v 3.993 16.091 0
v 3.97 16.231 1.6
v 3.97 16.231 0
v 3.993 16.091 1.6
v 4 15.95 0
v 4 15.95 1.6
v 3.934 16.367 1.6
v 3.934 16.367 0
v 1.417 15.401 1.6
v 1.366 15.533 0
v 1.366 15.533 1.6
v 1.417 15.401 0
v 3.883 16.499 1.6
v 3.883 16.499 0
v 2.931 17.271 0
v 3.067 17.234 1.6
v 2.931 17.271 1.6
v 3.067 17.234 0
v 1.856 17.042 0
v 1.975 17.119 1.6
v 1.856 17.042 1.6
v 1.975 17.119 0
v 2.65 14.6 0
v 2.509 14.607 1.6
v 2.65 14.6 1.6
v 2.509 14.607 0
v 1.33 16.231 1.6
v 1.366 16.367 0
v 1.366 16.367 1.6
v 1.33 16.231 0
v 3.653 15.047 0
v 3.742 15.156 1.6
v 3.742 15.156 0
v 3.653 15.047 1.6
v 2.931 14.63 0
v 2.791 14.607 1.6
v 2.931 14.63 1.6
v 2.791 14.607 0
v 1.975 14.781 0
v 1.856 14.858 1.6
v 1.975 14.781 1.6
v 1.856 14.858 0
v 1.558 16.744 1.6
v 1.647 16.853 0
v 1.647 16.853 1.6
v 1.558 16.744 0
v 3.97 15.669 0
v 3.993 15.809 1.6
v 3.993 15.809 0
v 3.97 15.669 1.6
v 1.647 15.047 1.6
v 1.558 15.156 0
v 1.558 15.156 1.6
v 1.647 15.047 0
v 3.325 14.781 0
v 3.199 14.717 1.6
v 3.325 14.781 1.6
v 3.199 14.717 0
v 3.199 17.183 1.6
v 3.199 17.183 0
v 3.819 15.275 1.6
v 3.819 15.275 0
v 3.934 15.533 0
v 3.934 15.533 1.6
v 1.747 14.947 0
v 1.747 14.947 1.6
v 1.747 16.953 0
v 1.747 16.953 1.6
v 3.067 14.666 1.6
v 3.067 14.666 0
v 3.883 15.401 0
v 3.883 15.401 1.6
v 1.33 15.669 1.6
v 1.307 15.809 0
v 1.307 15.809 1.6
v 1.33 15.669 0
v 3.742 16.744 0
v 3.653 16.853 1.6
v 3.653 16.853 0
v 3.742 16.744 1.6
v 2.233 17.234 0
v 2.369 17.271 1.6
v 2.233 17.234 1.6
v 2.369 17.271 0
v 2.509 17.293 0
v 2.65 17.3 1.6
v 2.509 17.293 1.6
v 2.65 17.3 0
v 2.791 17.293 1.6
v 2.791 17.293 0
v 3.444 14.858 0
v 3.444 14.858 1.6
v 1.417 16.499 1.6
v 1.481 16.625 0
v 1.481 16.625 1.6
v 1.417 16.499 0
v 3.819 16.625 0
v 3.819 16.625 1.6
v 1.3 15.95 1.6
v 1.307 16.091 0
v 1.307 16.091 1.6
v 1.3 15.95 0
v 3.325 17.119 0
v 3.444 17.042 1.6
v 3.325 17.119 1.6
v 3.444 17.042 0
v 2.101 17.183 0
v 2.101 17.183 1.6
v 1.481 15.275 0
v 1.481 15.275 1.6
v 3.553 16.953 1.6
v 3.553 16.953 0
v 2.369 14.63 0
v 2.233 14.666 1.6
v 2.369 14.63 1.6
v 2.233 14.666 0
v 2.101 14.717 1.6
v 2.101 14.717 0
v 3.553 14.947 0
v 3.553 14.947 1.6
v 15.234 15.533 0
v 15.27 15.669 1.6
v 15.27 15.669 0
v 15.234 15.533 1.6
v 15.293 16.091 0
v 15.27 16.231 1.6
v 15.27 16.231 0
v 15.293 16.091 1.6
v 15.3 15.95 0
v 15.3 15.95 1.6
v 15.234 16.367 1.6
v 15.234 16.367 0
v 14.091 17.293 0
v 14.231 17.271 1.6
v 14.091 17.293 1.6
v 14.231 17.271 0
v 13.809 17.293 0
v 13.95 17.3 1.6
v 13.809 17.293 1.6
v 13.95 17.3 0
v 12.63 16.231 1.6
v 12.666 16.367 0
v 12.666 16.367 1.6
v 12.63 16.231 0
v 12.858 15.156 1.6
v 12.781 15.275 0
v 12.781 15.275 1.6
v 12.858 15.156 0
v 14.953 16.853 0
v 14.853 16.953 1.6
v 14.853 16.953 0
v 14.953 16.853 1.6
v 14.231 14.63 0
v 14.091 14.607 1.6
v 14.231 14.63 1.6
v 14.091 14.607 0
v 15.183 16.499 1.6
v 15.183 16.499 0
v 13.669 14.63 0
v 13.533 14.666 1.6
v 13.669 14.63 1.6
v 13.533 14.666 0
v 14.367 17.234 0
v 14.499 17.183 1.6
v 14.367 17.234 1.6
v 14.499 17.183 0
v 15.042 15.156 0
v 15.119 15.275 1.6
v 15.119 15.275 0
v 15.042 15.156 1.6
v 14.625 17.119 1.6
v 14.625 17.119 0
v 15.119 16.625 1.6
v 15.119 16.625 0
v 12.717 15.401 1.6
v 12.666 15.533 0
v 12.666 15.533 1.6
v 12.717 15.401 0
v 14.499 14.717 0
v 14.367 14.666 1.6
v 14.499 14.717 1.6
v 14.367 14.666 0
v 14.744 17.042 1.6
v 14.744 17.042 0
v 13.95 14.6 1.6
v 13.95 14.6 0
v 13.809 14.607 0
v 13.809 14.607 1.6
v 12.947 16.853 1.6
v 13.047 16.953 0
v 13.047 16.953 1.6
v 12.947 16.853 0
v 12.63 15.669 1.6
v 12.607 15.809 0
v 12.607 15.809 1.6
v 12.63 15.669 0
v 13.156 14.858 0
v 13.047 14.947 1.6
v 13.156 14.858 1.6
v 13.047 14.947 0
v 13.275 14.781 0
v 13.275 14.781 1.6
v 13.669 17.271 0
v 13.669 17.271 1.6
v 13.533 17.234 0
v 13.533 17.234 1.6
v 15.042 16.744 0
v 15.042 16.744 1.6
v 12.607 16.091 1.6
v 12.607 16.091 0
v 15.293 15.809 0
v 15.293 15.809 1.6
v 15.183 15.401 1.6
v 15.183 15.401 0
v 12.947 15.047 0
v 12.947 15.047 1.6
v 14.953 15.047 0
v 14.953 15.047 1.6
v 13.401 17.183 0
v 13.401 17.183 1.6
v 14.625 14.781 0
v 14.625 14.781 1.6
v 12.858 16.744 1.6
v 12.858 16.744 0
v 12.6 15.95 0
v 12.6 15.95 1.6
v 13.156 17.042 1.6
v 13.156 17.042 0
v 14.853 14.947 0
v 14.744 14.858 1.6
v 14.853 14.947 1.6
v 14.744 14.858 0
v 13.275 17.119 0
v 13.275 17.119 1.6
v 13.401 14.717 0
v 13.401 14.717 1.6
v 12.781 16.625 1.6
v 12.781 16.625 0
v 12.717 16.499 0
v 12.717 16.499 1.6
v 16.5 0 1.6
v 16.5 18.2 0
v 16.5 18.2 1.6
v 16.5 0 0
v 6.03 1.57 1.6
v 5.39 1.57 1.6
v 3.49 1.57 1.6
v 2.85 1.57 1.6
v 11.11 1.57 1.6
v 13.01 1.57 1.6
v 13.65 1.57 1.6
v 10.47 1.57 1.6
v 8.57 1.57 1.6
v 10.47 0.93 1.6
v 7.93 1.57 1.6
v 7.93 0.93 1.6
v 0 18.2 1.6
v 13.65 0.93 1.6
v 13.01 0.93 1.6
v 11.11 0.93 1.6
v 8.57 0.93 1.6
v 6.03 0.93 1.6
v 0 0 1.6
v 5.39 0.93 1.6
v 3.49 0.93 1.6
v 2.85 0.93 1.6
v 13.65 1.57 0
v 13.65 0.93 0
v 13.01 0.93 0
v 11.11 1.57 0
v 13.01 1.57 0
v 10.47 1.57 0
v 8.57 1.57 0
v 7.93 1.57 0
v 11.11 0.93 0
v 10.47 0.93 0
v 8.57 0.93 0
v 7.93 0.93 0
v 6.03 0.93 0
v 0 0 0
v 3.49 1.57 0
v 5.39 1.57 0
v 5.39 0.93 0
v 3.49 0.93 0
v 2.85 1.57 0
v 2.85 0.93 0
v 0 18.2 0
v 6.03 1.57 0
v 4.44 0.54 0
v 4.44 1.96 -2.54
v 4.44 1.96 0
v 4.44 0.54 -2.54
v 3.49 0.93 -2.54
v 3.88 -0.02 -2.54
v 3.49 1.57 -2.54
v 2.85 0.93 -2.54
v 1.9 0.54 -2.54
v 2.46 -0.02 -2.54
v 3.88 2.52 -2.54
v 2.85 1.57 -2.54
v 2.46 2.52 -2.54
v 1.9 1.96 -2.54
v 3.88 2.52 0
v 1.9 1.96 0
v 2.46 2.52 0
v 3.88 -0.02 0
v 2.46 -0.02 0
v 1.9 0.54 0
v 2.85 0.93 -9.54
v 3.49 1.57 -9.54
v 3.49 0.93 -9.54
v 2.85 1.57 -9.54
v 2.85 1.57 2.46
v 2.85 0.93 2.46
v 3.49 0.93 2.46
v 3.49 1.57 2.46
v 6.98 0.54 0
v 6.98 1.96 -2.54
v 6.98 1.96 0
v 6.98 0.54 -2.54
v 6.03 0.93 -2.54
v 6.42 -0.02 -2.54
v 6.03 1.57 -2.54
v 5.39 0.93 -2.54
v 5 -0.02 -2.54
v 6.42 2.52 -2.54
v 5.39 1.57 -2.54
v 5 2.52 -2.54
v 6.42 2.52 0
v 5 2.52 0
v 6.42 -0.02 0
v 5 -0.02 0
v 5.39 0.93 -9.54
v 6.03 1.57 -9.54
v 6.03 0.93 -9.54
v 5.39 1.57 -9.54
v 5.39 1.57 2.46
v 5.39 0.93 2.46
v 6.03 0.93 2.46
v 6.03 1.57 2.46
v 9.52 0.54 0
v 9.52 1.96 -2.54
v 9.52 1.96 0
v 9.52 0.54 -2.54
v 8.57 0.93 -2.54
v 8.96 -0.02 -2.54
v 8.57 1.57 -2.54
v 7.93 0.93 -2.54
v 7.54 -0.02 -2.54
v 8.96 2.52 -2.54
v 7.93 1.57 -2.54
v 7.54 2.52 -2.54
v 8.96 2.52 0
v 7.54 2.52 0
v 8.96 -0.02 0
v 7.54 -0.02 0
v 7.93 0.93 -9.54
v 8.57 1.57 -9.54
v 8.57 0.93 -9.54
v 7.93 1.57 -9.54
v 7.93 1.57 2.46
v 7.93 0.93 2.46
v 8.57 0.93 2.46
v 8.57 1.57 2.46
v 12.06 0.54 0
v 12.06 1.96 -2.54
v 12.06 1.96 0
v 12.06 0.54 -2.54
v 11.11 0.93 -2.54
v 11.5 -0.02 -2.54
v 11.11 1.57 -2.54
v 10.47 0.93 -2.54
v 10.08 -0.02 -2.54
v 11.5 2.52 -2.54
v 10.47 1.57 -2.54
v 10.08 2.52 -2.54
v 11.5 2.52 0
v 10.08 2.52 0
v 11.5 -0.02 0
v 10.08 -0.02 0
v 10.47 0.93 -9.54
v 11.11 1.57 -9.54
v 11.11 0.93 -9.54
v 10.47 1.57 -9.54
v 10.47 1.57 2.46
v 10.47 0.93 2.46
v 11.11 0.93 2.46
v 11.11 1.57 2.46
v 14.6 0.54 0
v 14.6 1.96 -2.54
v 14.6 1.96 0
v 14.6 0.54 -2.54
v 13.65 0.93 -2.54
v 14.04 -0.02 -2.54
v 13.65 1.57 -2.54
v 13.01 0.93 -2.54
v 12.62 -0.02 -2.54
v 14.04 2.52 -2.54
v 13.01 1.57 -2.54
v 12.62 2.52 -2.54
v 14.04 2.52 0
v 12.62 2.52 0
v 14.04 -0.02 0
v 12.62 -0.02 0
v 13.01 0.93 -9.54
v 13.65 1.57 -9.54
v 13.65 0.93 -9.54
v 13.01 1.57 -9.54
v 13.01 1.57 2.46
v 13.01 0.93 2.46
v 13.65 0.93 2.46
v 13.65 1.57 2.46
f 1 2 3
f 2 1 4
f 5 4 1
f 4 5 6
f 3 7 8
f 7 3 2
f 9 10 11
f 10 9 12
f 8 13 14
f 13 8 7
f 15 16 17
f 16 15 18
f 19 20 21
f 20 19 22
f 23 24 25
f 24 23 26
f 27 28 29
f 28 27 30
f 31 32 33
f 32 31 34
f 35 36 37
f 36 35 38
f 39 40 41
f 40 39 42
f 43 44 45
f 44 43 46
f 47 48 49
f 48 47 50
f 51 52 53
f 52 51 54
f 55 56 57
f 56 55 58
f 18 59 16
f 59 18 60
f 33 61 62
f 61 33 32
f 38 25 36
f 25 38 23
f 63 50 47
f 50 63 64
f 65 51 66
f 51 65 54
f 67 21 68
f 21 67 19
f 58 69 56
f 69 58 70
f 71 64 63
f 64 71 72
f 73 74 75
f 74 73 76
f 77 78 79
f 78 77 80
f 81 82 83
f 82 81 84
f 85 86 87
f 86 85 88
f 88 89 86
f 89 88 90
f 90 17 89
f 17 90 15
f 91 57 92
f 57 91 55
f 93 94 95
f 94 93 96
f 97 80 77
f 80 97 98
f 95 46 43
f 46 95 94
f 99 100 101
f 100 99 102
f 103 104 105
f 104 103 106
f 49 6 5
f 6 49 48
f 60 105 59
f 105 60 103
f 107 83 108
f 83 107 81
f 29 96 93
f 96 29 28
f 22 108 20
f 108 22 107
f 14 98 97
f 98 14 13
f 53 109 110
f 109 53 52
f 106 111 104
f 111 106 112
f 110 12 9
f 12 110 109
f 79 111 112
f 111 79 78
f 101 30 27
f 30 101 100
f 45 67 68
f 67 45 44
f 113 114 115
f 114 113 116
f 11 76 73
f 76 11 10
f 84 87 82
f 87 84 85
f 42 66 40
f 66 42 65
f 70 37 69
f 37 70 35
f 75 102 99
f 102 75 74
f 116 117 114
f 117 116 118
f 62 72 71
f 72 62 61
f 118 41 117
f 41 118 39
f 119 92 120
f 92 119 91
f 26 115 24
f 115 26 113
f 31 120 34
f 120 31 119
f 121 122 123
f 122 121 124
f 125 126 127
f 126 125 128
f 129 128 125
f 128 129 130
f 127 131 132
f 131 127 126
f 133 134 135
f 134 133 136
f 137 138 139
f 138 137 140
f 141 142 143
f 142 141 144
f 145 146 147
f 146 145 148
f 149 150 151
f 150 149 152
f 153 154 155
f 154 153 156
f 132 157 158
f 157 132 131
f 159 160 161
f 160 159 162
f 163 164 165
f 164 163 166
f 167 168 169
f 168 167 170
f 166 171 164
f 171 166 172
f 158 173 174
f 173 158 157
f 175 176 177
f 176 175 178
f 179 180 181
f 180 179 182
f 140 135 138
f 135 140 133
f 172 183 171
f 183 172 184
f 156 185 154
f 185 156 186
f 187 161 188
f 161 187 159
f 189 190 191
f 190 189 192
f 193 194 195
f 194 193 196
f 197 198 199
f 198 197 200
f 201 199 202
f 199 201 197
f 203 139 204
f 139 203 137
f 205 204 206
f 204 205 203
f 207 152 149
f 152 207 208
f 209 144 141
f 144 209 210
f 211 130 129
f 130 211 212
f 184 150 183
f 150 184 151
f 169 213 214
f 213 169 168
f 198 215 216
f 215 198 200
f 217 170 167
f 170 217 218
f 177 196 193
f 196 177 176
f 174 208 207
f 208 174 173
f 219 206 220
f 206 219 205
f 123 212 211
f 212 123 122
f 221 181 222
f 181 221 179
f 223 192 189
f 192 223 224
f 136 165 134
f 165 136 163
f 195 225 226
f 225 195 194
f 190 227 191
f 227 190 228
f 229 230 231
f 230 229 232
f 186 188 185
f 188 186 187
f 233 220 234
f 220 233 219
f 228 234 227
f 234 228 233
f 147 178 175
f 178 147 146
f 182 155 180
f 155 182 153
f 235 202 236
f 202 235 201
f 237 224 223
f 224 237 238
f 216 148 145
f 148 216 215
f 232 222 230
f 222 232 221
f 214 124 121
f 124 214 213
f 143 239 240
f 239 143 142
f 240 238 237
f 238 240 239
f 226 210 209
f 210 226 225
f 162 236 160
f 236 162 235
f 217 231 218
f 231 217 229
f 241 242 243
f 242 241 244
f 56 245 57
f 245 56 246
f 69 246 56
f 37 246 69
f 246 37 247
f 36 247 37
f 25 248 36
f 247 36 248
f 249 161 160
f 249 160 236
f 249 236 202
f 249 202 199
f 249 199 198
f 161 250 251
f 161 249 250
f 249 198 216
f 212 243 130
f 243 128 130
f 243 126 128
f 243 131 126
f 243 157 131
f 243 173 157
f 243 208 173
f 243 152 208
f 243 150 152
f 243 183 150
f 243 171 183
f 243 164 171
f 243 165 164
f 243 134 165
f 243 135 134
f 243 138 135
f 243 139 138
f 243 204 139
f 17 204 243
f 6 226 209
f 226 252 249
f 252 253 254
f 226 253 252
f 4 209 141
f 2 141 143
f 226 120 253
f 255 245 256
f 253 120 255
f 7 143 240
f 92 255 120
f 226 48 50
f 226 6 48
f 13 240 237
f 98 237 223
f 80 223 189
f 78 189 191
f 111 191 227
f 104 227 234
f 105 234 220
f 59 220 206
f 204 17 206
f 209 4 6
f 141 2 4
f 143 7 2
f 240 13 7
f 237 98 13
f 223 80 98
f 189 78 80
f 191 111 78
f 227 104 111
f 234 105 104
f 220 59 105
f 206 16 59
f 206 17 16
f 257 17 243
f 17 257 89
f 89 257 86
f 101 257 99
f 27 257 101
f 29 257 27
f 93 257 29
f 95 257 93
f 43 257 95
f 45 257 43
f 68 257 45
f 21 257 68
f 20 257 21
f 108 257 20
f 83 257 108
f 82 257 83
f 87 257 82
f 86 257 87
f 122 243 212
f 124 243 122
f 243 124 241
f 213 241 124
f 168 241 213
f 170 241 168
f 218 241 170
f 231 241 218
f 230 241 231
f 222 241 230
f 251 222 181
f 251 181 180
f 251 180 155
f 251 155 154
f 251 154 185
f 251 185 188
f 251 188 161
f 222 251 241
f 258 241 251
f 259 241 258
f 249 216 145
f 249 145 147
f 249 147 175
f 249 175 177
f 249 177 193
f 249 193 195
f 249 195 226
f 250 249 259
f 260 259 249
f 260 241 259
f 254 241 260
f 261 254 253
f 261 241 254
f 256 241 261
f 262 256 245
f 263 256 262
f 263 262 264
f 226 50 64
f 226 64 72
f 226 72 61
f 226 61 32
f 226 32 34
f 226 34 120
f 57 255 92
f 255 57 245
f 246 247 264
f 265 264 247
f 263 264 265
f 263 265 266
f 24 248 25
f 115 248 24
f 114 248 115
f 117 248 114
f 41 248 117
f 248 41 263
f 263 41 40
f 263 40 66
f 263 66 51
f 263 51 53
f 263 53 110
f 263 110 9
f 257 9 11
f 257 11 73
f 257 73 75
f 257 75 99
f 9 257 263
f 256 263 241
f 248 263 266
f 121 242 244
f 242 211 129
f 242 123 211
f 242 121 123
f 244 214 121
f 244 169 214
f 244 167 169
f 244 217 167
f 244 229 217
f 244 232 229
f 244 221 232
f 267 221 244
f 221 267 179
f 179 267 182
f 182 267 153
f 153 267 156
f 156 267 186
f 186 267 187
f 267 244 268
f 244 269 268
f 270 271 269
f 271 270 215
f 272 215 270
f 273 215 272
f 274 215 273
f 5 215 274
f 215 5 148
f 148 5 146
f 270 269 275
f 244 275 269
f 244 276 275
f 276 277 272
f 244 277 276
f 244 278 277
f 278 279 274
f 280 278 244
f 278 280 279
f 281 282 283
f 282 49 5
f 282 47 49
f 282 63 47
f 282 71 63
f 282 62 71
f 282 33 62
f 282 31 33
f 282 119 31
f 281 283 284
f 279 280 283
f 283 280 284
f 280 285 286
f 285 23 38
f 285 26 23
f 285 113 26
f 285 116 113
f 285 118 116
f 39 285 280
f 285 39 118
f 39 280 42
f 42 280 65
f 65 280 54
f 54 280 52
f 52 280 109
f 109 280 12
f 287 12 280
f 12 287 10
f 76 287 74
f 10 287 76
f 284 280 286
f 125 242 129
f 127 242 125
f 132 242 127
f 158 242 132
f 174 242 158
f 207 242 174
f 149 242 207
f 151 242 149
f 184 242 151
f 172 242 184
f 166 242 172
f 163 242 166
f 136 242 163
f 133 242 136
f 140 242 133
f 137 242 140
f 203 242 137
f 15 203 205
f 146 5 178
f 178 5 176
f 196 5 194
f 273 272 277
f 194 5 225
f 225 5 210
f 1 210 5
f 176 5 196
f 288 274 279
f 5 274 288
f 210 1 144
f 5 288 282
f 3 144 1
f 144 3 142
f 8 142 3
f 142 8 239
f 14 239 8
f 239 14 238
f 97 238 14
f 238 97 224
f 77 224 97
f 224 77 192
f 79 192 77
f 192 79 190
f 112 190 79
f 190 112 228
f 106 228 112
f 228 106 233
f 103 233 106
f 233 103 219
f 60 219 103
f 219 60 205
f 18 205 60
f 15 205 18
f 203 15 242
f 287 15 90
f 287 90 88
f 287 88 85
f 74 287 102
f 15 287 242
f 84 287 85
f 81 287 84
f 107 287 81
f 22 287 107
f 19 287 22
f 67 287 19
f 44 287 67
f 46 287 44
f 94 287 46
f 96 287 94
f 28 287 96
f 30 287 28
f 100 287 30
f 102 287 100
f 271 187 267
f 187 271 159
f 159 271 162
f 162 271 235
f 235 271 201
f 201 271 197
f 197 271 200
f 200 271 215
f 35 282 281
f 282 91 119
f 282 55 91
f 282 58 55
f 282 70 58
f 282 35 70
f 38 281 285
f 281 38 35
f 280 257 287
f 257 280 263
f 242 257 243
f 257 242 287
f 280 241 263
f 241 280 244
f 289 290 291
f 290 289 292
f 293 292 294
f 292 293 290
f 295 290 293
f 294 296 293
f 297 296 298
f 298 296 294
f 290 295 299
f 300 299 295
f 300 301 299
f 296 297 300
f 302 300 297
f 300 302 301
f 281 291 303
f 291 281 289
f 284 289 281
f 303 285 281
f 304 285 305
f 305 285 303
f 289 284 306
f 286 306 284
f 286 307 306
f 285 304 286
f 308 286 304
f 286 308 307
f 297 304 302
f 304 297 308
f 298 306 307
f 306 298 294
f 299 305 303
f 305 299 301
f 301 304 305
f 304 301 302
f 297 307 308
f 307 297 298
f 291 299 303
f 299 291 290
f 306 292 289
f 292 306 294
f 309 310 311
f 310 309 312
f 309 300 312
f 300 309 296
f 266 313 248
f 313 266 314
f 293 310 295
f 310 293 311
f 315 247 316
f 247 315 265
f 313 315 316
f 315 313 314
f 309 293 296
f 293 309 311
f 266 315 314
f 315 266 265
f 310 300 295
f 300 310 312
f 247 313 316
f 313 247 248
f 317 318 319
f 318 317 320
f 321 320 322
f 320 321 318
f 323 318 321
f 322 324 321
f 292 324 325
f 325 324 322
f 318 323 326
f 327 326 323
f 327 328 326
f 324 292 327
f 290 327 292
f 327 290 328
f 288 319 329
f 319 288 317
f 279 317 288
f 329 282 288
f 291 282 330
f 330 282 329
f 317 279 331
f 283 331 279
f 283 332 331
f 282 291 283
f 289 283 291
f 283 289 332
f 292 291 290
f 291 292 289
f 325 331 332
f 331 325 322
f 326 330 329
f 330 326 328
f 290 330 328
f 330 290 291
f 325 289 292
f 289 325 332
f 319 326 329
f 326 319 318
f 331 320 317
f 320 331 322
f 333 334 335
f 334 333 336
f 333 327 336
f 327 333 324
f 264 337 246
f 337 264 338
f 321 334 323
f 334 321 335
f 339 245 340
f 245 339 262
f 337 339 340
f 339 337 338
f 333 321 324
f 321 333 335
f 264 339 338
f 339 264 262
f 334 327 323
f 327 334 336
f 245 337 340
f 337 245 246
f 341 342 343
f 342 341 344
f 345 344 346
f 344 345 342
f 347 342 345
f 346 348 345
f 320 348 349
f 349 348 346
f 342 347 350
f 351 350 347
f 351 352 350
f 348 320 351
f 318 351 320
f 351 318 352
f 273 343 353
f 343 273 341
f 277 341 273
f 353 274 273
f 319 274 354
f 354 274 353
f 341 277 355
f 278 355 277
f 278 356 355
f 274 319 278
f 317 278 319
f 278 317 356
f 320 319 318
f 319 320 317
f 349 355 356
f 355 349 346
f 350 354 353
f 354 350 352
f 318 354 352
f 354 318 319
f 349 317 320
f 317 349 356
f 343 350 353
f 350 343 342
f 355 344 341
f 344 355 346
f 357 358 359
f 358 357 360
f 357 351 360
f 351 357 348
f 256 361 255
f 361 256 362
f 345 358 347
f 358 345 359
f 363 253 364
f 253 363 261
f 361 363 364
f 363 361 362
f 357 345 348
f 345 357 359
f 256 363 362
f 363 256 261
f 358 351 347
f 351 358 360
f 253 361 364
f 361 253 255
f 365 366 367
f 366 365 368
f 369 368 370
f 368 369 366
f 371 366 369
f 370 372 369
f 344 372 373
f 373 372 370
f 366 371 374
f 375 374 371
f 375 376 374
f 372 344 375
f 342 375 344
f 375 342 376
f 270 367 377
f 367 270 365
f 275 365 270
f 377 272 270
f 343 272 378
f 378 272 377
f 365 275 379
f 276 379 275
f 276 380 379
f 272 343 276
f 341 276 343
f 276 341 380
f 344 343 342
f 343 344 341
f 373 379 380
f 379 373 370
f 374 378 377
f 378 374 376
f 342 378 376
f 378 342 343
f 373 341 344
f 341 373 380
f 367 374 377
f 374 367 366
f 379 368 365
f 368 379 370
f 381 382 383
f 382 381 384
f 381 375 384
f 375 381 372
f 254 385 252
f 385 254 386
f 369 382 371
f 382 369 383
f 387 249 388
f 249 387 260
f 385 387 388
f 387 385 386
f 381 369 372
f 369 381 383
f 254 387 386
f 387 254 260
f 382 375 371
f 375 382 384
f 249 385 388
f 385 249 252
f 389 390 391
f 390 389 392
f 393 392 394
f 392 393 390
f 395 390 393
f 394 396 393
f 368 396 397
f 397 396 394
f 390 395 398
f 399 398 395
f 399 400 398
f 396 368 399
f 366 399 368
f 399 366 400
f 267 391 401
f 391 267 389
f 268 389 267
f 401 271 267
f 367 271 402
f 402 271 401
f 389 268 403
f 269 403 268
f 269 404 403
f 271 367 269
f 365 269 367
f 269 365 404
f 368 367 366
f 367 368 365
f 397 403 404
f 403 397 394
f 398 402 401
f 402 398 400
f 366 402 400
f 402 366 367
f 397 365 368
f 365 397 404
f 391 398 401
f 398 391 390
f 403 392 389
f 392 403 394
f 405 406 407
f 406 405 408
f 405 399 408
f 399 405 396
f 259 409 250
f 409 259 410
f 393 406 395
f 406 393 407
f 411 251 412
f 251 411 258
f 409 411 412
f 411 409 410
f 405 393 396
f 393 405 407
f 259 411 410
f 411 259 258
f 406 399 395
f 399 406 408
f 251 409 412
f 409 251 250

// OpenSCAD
// file: pin_headers.scad
// pin_headers.scad
//
// Model of through-hole pin headers. 
// 
// Units are metric
//
// "height" is the total length of the pin. Default is 12mm.
// "upper" is the length of the pin above the stopper. Default is 7mm.
// "rows" is the number of rows. Default is 3.
// "cols" is the number of columns. Default is 2.
//
// Examples:
// pin_header( 12, 7, 2, 5);
// pin_header( rows=5 cols=1 );
// By Paul McGovern

module pin_header( height=12, upper=7, rows=3, cols=2 ) {

	cl = 2.54;

	translate( [ -(rows  * cl/2 ) + cl /2, -(cols  * cl/2 ) + cl /2, 0 ] ) {

		for( col = [0: cols -1 ] ) {
			for( row = [0 : rows -1 ] ) {

				translate( [ cl * row , cl * col, 0] ) {
	
					color( "gray" )
						translate( [0,0, cl / 2]) {
							intersection() {
								cube( [ cl, cl, cl ], center=true );
								rotate( [0, 0, 45] ) cube( [ 2.8, 2.8, cl ], center=true );
						}
				}

				color( "silver" ) {
					translate( [0,0, (upper - ( height/2 )) + cl ] ) {
						union() {
							cube( [0.64,0.64,height], center=true );
							translate( [0,0, height/2 ] ) scale( 0.64 ) _pin_point();
							translate( [0,0, -height/2 ] ) scale( 0.64 )	rotate([180,0,0] )_pin_point();
						}
					}
				}
			}
		}
	}
}
}

module _pin_point() {
	translate( [-0.5,-0.5, 0])
		polyhedron( 
			points=[[0,0,0],[0,1,0],[1,1,0],[1,0,0],[0.5,0.5,0.5]], 
			triangles=[[0,1,2],[0,2,3],[0,1,4],[1,2,4],[2,3,4],[3,0,4]]);
}
// main file
// Sensor modules from Adafruit
// License GNU AFFERO GENERAL PUBLIC LICENSE v3+
// Copyright 2014 Christian Ege <k4230r6@gmail.com>


use <pin_headers.scad>;

sensor_drill_holes = 2.3;
sensor_z = 1.6;

// Humidity
htu21d_x = 16.5;
htu21d_y = 18.2;
htu21d_z = sensor_z;
htu21d_holes = [  [2.45,15.75],  [13.75,15.75]];

// Lux - Sensor
tsl2591_x = 19.1;
tsl2591_y = 16.4;
tsl2591_z = sensor_z;
tsl2591_holes = [ [2.45,13.7],  [15.15,13.7] ];

// Presure Sensor
bmp180_x = 17.6;
bmp180_y = 19.3;
bmp180_z = sensor_z;
bmp180_holes = [  [2.45,17.0],  [15.15,17.0]  ];


module base_sensor(clearance = 0,  size , holes, drill,rows) {
	echo( "size: ",size[0],size[1],size[2]);
	echo ("holes: ",holes);
	echo("drill: ", drill);
	echo("clearance:",clearance);
	difference () {
		cube(size);
		for(i = holes ) {
			translate ([clearance,clearance,-clearance]) {
				translate (i) {
					#cylinder(h =  size[2]+2*clearance , r=((drill/2)+clearance), $fn=60 ) ;
				}
			}
		}
	}
	translate([(size[0])/2,+1.25,0]) {
		rotate([180,0,0]) {
			pin_header(rows=rows,cols=1);
		}
	}
}


module htu21d (clearance = 0.0,drill=sensor_drill_holes)  {
	base_sensor(clearance = clearance, size=[htu21d_x,htu21d_y,htu21d_z], holes=htu21d_holes, drill=drill,rows=5) ;
}

module tsl2591 (clearance=0.0,drill=sensor_drill_holes )  {
	base_sensor(clearance = clearance, size=[tsl2591_x,tsl2591_y,tsl2591_z], holes=tsl2591_holes, drill=drill,rows=6) ;
}

module bmp180 (clearance=0.0, drill=sensor_drill_holes )  {
	base_sensor(clearance=clearance, size=[bmp180_x,bmp180_y,bmp180_z], holes=bmp180_holes, drill=drill,rows=5) ;
}

//bmp180(clearance=0.2, drill = sensor_drill_holes);
//tsl2591 (clearance=0.2, drill = sensor_drill_holes );
htu21d(clearance=0.2, drill = sensor_drill_holes );
